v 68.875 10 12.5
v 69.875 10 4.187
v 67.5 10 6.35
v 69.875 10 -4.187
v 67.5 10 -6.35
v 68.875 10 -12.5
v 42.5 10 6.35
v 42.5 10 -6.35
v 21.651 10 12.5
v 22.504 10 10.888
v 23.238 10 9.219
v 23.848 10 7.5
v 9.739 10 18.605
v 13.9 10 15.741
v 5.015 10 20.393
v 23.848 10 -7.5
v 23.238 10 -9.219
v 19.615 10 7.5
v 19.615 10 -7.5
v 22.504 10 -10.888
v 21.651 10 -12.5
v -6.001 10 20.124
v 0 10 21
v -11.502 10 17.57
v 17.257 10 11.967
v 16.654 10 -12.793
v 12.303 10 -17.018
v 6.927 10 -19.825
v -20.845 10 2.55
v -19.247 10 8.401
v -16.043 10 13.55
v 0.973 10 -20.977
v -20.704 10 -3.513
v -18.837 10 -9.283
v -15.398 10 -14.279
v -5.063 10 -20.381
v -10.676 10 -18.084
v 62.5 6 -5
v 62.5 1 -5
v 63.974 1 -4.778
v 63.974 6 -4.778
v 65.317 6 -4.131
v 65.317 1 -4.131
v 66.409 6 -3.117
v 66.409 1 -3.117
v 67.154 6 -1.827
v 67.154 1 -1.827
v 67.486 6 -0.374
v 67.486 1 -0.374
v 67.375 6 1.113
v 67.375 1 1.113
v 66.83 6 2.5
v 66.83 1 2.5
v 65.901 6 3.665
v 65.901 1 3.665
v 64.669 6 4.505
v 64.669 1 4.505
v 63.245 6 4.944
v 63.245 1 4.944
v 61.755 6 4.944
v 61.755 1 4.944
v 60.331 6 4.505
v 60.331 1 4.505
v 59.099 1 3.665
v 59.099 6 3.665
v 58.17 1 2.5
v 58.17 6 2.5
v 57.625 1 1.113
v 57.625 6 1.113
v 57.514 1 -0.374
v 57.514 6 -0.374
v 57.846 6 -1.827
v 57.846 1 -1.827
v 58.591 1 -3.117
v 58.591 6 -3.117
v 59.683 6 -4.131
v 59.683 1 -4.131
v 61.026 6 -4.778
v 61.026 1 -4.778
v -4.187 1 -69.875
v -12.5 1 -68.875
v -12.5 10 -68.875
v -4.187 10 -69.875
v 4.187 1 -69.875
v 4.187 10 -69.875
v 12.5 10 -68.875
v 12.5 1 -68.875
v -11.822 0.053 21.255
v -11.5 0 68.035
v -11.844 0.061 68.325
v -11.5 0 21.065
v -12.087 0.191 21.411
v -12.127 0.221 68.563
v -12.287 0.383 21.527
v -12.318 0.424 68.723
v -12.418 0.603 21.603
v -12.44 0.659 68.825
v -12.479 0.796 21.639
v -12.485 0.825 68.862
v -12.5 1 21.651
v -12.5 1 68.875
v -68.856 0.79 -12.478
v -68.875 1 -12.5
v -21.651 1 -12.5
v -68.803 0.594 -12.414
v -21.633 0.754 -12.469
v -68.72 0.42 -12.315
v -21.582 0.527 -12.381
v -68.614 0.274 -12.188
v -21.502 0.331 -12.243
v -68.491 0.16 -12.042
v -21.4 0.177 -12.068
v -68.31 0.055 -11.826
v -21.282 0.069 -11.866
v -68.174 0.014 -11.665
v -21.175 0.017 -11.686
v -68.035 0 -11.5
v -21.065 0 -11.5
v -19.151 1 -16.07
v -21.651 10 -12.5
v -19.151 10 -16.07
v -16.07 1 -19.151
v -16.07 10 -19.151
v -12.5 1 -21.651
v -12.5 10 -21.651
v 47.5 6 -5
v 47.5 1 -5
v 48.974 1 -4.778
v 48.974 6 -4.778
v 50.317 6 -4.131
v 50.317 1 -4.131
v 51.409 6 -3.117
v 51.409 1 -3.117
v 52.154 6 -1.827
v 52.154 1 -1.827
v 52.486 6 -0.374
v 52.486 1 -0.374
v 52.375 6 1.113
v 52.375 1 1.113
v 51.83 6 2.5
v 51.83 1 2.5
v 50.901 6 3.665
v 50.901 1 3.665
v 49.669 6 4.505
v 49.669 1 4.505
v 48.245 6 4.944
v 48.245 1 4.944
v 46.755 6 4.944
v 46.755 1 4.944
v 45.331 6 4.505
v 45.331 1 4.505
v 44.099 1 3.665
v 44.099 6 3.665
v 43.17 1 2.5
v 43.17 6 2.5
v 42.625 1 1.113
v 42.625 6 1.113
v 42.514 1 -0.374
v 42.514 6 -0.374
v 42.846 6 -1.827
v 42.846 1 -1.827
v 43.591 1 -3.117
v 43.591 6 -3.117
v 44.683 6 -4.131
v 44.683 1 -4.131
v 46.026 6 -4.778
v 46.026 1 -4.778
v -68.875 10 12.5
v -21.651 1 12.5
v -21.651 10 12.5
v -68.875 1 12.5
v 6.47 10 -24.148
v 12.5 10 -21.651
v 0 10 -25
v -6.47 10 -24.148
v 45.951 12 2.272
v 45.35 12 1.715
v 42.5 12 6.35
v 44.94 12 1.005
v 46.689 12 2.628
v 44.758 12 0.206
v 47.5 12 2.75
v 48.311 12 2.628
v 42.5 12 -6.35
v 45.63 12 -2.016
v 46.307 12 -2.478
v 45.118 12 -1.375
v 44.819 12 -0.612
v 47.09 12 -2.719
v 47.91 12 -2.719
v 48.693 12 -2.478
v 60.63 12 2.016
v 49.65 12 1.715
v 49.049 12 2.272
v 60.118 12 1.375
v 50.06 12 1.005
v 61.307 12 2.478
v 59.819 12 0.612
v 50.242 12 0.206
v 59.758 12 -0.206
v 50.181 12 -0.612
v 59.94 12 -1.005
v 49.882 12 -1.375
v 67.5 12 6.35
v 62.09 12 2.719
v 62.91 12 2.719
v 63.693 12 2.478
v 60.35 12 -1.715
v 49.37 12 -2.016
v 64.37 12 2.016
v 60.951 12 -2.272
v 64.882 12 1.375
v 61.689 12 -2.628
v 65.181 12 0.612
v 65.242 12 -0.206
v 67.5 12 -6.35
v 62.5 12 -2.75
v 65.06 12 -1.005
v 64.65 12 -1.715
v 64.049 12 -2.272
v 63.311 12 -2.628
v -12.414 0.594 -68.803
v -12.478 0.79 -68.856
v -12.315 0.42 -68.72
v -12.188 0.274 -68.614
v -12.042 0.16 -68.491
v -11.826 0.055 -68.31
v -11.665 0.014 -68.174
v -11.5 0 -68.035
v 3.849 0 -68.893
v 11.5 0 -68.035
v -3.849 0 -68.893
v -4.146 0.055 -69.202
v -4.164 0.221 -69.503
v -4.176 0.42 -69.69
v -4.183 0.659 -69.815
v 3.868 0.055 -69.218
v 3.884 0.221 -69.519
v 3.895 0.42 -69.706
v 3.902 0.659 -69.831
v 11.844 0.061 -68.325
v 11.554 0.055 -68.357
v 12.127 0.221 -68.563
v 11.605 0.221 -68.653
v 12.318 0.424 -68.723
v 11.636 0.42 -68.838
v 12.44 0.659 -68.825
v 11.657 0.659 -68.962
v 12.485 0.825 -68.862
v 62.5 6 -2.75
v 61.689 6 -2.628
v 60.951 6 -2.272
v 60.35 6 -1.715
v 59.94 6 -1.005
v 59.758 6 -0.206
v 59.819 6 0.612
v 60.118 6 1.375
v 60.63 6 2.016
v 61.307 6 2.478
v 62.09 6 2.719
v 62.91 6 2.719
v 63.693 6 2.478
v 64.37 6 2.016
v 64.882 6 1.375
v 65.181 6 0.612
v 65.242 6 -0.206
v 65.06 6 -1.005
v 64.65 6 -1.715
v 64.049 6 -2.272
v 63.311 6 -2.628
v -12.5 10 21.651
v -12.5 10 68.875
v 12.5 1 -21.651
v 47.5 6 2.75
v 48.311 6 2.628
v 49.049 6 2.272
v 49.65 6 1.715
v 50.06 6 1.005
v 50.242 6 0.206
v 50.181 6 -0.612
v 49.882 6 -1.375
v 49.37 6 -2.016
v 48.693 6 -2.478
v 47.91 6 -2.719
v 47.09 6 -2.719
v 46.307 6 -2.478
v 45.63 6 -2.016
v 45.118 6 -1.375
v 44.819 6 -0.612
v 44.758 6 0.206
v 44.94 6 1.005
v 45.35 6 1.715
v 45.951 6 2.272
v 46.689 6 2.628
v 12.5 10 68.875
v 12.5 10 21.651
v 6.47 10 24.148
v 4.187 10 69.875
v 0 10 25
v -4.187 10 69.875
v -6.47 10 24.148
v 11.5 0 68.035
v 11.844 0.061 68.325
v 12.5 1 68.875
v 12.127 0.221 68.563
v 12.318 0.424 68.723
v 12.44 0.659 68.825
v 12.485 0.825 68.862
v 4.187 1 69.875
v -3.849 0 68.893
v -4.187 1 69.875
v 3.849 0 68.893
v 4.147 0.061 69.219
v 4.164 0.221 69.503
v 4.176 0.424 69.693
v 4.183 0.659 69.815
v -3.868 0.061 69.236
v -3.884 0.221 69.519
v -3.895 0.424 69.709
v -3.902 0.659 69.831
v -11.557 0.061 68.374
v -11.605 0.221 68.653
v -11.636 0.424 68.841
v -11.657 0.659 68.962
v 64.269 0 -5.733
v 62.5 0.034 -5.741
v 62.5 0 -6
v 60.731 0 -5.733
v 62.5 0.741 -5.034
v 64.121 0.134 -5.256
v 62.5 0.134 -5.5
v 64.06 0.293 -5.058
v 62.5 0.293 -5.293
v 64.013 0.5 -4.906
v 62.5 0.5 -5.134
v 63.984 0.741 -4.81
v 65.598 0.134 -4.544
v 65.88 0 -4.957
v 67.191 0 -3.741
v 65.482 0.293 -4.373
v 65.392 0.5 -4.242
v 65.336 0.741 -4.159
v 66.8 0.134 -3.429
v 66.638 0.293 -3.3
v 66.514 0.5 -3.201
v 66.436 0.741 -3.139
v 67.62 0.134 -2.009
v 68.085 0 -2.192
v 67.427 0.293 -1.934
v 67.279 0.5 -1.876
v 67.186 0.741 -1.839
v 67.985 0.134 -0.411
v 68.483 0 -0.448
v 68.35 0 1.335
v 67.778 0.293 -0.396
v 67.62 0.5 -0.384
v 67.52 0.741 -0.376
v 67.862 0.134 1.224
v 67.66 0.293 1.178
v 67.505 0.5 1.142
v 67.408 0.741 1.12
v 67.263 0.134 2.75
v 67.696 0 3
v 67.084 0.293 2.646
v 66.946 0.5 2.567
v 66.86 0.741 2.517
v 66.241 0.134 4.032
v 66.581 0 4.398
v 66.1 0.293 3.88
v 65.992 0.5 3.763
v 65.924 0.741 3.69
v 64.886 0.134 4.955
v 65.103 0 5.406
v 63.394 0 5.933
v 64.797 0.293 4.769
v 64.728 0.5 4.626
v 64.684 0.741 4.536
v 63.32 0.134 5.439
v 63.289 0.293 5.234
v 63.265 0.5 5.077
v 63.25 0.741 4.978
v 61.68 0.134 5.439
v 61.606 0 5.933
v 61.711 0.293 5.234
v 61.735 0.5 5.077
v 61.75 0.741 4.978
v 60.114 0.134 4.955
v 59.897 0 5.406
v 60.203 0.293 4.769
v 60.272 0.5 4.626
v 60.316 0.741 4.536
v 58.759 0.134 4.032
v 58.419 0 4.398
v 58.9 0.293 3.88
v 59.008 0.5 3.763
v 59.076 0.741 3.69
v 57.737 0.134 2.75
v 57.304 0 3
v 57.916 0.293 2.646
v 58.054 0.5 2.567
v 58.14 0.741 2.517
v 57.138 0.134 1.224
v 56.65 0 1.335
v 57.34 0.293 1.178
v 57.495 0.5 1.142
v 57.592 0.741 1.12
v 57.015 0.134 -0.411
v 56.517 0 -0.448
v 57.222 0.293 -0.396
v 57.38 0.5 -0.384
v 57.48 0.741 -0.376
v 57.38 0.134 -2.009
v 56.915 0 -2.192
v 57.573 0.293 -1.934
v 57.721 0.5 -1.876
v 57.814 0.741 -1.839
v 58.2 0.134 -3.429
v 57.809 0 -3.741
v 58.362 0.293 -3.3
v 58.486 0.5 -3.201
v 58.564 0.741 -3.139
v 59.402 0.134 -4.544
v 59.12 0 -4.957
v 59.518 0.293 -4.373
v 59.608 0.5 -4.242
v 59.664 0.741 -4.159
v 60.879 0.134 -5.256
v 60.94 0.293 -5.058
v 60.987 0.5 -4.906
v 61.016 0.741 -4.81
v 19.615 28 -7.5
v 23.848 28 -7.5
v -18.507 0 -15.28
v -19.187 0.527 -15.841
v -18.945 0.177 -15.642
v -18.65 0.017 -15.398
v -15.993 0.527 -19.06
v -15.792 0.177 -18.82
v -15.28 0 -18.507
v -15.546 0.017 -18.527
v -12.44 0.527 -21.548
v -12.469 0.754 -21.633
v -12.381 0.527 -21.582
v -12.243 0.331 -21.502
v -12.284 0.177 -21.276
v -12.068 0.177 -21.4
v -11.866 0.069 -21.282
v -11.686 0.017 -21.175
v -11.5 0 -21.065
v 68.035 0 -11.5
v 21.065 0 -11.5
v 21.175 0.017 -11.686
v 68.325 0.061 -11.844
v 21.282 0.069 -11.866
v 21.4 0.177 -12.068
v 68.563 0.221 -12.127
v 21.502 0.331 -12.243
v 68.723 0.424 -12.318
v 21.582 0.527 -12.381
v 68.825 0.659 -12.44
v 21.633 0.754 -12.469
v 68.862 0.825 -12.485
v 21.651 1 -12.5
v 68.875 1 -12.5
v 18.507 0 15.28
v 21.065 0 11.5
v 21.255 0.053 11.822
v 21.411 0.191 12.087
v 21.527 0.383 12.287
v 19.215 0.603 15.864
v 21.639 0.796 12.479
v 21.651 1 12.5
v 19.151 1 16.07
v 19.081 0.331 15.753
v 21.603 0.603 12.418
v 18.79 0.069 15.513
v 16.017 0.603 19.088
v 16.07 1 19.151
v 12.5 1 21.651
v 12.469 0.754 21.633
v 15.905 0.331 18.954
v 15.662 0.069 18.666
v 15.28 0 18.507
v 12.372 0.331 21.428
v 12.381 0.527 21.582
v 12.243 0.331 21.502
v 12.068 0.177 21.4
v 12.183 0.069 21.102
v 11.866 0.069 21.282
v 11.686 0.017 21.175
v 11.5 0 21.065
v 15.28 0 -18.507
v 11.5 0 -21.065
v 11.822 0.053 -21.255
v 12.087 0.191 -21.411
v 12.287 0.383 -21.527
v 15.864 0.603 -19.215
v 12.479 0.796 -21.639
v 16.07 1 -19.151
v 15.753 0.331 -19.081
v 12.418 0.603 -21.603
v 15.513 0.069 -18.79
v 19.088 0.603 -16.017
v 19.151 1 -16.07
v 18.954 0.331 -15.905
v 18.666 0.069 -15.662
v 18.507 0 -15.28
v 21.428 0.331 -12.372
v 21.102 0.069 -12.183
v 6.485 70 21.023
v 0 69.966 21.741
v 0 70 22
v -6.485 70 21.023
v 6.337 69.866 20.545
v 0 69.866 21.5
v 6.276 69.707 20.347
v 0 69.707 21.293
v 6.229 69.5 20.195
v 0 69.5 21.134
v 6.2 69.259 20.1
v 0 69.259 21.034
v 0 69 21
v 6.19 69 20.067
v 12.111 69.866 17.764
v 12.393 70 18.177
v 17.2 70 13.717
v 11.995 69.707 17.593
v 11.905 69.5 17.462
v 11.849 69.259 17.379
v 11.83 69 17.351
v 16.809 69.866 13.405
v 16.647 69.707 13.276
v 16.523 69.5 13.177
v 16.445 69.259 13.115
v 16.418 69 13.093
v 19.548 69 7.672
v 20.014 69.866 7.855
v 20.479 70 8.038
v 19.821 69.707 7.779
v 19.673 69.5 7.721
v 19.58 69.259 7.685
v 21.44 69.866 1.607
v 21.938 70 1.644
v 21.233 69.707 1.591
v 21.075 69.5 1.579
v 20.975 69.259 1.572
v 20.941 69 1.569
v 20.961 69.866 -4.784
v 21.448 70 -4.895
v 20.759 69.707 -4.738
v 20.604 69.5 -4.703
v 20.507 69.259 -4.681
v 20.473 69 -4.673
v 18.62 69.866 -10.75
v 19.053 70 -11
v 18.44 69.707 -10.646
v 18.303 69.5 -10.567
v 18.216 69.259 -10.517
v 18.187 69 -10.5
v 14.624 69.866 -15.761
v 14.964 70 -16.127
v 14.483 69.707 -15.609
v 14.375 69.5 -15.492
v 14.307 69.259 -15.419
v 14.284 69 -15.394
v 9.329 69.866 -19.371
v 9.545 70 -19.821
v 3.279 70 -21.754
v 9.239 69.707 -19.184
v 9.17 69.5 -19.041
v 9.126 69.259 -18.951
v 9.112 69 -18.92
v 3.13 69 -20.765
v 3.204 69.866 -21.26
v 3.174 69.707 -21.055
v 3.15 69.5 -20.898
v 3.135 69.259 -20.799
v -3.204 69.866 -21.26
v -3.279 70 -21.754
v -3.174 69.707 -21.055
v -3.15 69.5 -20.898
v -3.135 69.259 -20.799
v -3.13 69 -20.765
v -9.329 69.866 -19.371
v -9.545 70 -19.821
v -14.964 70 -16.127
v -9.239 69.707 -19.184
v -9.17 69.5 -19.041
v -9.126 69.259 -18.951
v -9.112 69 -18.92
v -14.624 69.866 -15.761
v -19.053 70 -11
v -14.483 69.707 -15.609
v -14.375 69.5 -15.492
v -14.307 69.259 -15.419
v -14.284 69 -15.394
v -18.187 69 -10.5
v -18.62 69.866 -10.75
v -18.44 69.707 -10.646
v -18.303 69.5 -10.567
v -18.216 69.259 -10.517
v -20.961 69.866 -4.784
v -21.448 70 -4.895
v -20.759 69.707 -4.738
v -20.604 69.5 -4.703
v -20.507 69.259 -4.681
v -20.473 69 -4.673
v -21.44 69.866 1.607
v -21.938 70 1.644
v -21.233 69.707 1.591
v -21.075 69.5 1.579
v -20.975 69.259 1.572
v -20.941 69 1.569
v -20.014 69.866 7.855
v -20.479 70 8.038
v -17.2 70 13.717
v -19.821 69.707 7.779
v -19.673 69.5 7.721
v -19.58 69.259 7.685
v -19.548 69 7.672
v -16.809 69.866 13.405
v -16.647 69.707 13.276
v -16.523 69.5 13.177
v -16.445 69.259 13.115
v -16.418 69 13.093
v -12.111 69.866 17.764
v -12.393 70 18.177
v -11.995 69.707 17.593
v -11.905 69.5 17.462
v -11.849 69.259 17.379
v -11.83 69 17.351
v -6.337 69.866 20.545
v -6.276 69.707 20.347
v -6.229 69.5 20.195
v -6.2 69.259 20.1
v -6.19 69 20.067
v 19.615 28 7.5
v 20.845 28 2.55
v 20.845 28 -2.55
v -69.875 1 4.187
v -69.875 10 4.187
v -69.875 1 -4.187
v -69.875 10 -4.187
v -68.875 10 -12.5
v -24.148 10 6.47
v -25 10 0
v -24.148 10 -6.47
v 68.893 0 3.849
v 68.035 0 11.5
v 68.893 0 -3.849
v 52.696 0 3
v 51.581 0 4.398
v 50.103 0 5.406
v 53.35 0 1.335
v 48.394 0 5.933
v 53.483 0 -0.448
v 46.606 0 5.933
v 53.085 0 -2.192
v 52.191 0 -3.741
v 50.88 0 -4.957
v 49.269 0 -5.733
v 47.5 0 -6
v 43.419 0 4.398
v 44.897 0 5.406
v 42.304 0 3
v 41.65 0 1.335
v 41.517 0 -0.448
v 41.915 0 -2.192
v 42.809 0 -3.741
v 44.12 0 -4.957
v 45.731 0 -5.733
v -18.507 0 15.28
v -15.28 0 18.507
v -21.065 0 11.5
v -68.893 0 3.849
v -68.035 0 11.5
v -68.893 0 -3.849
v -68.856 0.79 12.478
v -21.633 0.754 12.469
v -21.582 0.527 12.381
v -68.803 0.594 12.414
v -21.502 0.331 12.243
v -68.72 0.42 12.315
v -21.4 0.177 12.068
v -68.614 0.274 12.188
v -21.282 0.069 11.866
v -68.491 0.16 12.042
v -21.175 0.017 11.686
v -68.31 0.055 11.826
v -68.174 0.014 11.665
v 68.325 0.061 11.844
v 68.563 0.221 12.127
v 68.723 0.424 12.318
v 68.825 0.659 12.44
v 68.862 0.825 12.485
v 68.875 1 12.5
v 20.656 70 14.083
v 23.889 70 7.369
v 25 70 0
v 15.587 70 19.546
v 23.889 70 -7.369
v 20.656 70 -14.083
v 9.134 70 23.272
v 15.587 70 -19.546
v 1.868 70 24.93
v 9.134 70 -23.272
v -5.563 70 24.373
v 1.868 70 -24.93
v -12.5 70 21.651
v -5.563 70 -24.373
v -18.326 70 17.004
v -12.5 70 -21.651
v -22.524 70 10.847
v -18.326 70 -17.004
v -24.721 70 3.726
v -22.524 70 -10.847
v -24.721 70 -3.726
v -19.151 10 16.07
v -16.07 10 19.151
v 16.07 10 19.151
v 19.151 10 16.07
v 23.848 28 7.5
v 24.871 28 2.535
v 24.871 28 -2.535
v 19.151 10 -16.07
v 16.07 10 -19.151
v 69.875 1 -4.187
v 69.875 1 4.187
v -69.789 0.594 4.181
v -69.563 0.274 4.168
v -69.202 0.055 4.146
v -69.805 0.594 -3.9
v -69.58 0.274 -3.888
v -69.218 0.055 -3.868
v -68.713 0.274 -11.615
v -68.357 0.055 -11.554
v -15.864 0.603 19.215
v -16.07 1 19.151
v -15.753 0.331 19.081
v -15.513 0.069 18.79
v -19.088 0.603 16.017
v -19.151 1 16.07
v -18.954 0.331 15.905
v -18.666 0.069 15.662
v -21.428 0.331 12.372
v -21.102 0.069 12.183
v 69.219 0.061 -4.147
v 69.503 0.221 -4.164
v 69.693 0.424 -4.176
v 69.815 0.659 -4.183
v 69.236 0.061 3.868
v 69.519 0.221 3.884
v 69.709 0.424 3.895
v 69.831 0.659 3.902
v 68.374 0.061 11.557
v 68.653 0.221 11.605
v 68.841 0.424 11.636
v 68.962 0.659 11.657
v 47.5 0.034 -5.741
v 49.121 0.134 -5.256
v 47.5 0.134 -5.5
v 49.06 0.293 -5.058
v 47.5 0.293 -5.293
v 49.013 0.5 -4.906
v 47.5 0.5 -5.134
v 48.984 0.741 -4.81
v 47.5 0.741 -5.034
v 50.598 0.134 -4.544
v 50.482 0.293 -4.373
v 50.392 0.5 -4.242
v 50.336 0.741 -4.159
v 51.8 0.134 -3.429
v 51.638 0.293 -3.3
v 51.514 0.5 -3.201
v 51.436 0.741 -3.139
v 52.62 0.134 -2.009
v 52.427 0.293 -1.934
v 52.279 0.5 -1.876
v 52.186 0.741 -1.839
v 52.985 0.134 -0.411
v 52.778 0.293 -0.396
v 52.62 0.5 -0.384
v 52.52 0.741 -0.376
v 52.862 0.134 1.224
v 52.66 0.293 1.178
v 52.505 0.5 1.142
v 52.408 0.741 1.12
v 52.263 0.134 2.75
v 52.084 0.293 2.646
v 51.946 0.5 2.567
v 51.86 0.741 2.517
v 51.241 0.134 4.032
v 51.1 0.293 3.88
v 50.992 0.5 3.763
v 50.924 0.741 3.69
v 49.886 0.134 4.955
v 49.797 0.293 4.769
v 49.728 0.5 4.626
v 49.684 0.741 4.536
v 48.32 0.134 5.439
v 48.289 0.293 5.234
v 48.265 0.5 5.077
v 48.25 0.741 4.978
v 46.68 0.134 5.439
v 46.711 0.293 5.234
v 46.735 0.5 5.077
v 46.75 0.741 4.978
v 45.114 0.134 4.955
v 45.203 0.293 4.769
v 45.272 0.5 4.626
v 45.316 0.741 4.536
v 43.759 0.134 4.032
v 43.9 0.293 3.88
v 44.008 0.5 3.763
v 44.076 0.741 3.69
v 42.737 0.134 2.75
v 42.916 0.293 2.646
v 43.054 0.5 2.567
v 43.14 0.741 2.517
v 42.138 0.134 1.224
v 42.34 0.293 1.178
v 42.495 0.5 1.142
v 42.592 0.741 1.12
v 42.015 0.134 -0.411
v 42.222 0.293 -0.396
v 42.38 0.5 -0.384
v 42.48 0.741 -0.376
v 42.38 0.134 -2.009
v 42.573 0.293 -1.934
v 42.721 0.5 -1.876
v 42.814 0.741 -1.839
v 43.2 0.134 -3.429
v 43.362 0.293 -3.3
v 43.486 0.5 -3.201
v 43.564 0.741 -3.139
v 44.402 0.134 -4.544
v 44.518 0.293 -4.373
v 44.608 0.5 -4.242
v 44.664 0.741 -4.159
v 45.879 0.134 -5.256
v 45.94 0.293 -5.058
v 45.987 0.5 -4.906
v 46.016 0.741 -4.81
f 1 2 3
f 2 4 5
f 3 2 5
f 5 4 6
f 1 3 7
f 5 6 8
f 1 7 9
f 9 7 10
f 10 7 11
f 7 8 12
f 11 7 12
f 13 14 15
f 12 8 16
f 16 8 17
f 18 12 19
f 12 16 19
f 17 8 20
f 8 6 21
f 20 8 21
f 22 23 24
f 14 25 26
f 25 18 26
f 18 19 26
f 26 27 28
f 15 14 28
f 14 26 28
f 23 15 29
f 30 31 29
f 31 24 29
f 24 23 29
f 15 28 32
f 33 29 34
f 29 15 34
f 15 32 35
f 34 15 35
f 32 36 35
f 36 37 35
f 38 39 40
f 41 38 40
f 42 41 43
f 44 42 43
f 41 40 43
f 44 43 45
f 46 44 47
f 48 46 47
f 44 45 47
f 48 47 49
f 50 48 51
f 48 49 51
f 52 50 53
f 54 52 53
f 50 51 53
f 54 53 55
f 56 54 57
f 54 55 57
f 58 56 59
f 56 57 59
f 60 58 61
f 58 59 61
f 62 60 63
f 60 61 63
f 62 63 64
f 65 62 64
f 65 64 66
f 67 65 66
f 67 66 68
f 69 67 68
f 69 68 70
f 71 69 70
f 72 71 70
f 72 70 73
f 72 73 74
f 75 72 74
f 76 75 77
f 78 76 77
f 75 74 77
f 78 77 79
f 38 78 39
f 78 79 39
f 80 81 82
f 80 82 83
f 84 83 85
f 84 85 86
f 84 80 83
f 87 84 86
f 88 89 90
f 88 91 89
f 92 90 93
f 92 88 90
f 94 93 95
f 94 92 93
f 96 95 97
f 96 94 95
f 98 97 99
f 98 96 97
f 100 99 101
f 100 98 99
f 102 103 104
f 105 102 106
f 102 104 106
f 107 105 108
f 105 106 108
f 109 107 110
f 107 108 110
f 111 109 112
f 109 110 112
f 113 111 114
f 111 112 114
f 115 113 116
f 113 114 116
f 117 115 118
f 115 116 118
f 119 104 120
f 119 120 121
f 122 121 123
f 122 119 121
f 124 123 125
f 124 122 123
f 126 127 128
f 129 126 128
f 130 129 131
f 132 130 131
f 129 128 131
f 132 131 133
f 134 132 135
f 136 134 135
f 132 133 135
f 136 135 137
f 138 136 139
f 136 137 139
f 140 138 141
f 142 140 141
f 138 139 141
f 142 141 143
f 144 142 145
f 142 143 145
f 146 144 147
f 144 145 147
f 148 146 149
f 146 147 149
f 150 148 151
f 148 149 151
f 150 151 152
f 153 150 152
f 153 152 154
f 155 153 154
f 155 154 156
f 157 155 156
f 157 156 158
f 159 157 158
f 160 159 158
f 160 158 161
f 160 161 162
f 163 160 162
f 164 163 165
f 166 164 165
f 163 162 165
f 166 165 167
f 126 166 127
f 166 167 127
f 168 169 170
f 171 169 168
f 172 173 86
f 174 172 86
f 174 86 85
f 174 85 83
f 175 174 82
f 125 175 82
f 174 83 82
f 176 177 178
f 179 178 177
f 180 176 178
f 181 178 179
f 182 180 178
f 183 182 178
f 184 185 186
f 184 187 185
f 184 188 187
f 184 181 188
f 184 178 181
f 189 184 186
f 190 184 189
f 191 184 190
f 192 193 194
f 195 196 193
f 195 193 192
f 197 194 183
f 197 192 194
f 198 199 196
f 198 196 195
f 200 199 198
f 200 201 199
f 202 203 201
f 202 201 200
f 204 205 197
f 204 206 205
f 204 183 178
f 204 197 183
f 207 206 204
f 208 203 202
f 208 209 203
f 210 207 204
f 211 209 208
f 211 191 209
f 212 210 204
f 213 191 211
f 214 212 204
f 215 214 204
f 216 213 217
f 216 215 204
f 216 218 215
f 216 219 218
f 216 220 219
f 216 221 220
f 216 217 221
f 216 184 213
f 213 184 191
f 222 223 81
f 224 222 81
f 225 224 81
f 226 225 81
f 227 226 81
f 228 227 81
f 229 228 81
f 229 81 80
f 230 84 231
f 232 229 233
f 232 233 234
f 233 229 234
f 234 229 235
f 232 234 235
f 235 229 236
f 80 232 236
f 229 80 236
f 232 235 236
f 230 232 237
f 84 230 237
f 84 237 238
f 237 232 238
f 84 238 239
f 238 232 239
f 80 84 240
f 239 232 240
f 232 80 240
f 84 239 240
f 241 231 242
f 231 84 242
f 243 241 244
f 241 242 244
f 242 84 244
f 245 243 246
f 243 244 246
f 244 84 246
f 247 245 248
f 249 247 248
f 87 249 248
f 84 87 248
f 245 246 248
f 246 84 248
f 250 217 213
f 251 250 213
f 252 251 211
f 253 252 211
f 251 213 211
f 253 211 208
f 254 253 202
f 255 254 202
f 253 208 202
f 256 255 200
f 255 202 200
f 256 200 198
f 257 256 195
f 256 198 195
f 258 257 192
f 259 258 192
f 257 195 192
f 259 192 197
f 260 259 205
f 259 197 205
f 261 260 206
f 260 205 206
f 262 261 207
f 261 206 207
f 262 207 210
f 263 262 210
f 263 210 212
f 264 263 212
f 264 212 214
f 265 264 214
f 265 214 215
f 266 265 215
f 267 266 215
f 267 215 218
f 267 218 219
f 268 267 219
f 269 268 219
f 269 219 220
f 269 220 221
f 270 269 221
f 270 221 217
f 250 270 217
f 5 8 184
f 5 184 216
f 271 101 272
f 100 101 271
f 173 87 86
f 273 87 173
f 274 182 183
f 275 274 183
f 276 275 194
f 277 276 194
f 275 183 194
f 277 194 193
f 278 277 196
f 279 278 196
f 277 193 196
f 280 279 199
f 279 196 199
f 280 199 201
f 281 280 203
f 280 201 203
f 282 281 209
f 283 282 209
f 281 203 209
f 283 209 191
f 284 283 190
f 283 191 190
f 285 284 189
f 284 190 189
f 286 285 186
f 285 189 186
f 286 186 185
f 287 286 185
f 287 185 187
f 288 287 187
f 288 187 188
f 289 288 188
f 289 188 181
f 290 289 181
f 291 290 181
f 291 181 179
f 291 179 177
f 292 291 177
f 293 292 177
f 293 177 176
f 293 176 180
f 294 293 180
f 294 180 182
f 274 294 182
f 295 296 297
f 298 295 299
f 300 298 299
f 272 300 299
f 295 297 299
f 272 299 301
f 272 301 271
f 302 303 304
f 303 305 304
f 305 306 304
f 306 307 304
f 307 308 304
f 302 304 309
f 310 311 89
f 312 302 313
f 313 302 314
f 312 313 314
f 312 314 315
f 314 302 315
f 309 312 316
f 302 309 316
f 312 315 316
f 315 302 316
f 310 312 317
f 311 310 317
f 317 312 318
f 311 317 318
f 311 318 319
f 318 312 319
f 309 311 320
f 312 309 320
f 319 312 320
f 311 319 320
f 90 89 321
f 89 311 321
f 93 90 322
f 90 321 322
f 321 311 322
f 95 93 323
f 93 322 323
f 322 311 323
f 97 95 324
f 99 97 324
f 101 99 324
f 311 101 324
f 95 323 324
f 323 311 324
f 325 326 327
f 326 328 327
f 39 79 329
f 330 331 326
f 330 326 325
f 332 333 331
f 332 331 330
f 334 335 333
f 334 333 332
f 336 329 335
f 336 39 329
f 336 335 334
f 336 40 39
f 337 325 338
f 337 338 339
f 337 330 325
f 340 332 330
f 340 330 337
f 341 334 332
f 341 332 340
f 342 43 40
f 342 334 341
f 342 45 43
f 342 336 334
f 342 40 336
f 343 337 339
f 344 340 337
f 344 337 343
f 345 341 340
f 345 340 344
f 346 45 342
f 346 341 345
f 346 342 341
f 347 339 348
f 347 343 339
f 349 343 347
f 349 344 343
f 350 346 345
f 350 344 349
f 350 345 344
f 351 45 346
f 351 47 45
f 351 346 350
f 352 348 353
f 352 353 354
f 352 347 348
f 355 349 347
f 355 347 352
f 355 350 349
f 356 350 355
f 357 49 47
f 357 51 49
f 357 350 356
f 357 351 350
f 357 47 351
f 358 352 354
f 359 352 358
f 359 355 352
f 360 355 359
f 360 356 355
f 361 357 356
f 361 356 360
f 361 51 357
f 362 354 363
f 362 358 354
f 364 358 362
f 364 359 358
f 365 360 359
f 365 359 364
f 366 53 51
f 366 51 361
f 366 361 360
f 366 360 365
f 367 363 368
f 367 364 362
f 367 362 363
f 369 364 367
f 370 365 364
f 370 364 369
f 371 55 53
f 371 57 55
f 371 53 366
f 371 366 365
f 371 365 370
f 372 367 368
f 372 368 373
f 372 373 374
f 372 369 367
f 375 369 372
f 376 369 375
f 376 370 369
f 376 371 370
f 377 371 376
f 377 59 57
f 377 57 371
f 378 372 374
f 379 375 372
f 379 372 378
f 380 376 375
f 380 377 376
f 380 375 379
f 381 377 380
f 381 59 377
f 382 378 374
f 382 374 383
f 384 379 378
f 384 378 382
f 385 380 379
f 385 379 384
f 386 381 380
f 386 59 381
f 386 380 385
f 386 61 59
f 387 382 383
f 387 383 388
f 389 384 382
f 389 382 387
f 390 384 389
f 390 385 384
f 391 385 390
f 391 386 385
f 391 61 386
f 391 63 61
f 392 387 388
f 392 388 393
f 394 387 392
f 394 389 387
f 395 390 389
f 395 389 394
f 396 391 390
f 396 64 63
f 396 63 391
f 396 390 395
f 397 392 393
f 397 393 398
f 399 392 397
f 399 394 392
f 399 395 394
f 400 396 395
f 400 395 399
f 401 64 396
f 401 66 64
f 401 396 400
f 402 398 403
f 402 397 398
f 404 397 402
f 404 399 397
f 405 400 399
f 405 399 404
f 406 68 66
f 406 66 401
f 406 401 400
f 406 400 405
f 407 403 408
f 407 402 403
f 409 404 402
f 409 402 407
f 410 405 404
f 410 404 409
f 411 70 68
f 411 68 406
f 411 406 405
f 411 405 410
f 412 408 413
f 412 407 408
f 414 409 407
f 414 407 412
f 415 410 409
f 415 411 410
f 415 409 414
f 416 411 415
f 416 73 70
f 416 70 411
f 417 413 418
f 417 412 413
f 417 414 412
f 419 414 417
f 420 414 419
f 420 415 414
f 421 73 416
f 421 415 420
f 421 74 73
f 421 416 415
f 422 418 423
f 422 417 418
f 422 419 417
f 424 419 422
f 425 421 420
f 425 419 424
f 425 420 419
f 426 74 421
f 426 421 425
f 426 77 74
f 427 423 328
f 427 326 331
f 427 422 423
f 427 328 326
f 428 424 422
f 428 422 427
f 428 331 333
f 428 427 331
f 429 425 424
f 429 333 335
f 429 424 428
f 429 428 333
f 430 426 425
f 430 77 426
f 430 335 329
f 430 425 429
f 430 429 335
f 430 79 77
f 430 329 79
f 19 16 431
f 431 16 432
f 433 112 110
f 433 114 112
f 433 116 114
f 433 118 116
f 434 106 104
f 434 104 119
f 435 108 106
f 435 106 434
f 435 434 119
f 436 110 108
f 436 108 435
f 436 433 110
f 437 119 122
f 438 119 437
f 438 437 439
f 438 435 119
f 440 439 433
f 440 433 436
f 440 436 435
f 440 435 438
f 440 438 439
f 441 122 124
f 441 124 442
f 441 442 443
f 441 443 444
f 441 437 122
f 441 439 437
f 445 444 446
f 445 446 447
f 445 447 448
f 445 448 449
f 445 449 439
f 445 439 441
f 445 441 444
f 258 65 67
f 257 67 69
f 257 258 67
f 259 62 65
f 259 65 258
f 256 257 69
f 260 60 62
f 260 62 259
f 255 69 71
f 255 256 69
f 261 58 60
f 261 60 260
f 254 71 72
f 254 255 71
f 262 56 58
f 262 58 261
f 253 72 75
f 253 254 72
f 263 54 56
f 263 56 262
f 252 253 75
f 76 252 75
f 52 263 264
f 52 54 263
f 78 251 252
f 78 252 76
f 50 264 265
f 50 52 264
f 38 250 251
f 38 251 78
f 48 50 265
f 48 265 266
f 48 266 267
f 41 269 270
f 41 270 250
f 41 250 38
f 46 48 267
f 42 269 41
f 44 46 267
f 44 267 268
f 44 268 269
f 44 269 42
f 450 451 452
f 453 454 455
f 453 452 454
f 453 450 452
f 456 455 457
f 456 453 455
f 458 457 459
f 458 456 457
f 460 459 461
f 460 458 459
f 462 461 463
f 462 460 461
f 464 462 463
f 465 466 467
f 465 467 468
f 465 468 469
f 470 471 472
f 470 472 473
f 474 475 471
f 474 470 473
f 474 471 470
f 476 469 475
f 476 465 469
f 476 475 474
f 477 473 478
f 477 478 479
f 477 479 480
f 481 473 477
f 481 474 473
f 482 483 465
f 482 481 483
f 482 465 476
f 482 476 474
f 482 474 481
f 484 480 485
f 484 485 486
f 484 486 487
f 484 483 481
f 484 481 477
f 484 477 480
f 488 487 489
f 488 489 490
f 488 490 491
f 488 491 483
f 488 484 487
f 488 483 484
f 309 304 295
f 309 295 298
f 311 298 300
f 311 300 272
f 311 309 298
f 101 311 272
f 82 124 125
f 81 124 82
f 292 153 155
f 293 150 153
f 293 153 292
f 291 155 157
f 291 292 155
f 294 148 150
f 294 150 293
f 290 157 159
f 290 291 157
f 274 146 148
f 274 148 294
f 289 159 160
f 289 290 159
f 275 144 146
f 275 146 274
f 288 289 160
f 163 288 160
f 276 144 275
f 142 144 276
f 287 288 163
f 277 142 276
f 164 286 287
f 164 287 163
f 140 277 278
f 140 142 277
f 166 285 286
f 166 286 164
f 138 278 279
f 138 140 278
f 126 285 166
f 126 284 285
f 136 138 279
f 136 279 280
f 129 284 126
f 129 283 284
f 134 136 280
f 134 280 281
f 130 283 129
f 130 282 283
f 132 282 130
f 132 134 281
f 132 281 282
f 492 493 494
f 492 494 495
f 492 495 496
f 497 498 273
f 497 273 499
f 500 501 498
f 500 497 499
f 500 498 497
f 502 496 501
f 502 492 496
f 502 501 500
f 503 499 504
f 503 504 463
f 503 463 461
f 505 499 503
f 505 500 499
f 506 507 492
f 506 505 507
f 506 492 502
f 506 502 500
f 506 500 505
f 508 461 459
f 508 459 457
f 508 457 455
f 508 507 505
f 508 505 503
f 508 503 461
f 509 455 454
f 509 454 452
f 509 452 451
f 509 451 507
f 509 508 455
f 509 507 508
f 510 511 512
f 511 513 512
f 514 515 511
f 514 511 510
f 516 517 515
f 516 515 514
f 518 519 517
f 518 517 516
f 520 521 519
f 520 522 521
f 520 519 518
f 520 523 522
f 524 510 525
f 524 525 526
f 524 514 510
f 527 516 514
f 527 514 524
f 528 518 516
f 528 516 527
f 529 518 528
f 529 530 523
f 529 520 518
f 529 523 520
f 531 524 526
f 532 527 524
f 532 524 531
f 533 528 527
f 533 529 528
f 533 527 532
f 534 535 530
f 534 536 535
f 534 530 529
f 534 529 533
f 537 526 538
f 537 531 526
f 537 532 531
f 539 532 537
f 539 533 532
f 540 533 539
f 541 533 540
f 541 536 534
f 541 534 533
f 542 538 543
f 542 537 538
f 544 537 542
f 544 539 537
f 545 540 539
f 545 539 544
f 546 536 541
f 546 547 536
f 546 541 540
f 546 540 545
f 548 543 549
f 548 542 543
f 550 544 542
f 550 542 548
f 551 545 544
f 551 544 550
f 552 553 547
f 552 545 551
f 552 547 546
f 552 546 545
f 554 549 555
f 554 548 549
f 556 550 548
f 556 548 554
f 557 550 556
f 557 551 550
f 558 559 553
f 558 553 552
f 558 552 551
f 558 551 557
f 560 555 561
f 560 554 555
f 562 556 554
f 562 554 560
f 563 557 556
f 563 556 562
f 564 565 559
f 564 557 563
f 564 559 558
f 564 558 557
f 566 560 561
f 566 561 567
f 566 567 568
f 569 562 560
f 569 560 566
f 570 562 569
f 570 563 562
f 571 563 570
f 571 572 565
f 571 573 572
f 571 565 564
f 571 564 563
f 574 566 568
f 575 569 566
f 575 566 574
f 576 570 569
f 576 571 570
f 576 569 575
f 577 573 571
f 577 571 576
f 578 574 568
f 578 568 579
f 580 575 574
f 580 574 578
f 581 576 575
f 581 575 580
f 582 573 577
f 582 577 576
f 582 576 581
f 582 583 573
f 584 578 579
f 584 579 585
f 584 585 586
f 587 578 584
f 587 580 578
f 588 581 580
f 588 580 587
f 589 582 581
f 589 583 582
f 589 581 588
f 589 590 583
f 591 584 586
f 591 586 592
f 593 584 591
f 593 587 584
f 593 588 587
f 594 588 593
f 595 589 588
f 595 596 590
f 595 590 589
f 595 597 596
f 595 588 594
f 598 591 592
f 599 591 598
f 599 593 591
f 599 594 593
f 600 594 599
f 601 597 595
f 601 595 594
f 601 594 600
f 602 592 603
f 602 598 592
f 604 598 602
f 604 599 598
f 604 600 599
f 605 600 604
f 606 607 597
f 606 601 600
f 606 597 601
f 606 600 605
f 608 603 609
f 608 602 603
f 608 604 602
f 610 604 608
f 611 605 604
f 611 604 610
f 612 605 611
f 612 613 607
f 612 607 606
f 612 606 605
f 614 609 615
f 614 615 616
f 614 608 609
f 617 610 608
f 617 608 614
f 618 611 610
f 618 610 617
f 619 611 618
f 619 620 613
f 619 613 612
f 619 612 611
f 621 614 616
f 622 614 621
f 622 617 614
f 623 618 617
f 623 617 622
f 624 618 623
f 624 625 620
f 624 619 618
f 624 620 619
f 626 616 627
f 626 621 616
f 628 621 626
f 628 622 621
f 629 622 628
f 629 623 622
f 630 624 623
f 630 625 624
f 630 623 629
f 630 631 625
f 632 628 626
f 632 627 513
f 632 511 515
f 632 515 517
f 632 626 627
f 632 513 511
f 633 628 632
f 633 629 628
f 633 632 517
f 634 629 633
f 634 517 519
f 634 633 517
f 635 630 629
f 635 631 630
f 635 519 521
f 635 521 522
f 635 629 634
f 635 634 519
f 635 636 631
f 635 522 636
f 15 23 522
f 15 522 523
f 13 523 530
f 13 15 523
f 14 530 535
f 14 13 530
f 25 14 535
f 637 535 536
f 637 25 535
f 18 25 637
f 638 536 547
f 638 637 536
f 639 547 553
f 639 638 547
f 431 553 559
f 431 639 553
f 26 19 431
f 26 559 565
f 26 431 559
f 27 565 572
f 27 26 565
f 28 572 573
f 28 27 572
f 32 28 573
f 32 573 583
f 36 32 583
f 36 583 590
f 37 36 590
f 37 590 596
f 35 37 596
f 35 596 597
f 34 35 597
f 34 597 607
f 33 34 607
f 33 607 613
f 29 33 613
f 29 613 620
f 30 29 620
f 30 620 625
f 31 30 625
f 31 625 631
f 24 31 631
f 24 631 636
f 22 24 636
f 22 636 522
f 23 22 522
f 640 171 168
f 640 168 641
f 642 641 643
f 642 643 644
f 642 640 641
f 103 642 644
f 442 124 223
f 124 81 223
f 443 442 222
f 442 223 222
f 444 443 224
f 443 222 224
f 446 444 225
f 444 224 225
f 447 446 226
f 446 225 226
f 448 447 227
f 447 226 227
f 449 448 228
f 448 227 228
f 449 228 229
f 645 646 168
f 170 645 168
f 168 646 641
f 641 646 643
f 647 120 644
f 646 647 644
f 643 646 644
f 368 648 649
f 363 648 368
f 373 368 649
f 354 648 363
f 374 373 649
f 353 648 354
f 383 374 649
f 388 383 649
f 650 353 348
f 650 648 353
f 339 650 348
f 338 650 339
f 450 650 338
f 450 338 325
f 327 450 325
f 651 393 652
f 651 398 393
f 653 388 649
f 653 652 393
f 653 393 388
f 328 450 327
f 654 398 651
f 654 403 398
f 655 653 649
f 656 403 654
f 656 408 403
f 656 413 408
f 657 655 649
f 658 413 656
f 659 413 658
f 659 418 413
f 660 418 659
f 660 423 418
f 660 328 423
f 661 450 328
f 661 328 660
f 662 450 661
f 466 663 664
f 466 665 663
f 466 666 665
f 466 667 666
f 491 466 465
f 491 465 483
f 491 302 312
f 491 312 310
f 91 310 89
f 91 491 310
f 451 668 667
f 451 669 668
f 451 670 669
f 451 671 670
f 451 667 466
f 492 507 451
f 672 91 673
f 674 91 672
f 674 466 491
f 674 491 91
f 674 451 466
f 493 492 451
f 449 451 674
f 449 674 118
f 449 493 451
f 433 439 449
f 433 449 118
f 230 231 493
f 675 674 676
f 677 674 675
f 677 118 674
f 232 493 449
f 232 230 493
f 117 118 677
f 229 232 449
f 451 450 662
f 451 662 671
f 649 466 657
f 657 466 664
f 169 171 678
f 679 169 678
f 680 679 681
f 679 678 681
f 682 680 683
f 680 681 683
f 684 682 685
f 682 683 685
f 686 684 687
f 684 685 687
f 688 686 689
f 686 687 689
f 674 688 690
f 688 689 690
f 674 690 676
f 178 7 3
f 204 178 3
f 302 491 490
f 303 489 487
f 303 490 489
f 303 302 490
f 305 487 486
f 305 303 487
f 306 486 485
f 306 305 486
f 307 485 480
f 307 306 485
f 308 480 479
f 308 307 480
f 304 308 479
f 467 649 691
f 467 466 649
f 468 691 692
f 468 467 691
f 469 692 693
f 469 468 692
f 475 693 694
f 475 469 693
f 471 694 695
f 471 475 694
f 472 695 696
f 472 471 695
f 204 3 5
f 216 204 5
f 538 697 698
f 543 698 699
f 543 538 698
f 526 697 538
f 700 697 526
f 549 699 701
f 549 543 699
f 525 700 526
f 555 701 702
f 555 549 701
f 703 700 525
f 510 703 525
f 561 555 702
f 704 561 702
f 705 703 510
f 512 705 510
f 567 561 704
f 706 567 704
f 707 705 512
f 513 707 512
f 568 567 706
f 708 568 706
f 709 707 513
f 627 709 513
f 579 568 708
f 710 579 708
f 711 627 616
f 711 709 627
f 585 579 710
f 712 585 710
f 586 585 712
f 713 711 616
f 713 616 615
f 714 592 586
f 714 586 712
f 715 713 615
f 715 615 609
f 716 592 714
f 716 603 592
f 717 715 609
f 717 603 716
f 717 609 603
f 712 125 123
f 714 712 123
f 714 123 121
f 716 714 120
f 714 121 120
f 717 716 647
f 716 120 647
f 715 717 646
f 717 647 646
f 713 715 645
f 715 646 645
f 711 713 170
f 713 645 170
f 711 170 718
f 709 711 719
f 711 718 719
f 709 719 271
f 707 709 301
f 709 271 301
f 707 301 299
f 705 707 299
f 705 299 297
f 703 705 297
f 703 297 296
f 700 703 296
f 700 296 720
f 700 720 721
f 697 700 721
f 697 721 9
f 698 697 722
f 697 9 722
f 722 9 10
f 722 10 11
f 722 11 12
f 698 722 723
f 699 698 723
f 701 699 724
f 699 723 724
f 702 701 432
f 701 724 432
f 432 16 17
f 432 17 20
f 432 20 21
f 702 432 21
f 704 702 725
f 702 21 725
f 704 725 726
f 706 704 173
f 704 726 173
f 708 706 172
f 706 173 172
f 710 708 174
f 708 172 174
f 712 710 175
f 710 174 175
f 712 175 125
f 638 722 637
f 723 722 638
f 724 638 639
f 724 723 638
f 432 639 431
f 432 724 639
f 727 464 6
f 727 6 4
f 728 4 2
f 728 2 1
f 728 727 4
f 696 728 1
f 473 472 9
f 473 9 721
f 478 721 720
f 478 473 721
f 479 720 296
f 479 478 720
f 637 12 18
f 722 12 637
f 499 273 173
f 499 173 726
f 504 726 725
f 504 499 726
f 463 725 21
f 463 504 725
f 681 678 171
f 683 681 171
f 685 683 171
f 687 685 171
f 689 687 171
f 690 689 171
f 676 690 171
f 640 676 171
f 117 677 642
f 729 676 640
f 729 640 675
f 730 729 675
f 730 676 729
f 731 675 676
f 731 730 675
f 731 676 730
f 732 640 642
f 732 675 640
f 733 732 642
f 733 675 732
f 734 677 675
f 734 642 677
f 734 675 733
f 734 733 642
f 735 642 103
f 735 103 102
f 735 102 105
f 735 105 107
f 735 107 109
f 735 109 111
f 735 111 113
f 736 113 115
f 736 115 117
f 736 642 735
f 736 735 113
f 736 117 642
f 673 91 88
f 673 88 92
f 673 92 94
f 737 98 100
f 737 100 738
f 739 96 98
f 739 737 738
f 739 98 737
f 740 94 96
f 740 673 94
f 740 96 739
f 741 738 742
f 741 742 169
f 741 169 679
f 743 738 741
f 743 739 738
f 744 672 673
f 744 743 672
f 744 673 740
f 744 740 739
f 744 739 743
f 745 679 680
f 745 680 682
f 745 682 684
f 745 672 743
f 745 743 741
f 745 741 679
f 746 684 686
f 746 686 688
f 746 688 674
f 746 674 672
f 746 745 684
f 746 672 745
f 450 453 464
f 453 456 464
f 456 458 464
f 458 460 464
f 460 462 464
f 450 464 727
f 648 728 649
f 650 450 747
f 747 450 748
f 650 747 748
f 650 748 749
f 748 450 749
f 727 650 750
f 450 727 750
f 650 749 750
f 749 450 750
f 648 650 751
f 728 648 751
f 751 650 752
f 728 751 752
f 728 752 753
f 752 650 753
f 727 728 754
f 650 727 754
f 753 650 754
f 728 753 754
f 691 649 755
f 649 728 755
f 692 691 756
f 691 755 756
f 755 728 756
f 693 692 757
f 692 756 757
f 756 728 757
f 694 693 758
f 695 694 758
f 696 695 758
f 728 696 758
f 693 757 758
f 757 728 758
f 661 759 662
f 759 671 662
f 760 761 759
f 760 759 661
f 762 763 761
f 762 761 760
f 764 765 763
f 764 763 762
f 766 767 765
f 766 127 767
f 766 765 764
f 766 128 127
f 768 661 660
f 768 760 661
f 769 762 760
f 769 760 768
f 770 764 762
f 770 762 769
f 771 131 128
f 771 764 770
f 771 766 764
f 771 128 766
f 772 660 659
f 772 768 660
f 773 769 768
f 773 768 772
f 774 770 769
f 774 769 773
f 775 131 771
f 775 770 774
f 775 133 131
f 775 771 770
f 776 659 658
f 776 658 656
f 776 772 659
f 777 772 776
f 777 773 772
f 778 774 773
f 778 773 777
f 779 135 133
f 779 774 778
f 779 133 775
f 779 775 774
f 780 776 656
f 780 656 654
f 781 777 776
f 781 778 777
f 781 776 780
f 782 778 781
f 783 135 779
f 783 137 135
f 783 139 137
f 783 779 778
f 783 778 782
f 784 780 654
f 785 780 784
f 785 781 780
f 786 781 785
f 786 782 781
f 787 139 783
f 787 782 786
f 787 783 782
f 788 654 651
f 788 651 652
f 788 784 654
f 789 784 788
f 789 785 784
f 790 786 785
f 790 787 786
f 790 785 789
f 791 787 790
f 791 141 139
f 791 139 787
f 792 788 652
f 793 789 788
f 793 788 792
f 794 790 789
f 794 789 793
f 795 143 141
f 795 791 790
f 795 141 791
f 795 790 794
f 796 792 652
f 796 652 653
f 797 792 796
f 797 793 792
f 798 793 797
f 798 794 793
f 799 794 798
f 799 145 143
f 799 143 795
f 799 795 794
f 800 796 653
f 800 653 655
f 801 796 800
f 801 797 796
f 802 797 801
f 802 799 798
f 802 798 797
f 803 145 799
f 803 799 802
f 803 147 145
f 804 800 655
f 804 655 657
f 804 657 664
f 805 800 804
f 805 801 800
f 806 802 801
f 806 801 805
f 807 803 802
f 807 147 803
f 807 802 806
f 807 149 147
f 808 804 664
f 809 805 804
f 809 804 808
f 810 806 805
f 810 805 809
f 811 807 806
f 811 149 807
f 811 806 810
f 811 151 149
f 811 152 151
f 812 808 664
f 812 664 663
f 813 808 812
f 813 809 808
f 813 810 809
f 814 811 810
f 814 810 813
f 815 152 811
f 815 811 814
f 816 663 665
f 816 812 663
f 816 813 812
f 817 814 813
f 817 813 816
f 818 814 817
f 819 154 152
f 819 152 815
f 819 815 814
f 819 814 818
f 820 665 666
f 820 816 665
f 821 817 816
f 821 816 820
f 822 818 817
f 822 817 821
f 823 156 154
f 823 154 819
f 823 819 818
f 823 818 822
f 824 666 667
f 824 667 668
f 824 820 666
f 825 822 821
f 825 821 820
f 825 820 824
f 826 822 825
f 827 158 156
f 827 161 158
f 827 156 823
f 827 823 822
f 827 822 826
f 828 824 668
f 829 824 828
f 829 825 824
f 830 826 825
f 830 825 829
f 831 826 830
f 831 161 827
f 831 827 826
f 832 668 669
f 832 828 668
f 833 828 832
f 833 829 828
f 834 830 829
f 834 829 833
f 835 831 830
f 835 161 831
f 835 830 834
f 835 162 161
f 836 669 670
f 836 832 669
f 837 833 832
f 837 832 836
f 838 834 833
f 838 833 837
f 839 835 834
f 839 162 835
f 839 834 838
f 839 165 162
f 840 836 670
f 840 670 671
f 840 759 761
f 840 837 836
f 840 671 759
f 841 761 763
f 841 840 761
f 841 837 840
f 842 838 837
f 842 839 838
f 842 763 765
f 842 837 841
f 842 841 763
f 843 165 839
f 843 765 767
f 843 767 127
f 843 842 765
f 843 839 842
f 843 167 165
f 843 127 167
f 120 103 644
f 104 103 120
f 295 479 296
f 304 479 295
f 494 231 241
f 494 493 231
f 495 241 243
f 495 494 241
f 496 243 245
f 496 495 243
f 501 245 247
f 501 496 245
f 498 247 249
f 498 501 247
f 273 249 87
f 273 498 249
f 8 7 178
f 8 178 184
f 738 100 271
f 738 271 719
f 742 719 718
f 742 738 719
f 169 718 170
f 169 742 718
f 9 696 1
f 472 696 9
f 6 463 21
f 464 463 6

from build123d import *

# Parameters (mm, degrees)
BOSS_EXTRUDE1_DEPTH = 10
SKETCH2_R           = 25
SKETCH2_R_2         = 21
BOSS_EXTRUDE2_DEPTH = 60
SKETCH3_W           = 15
SKETCH3_H           = 18
CUT_EXTRUDE1_DEPTH  = 10
SKETCH4_W           = 25
SKETCH4_H           = 12.7
BOSS_EXTRUDE3_DEPTH = 2
SKETCH5_R           = 2.75
CUT_EXTRUDE2_DEPTH  = 115.734476074
SKETCH6_R           = 5
CUT_EXTRUDE3_DEPTH  = 6
FILLET1_R           = 1


with BuildPart() as part:
    # Sketch1 → Boss-Extrude1 (new body)
    with BuildSketch(Plane(origin=(0, 0, 0), x_dir=(1, 0, 0), z_dir=(0, 1, 0))):
        with BuildLine():
            Line((-68.87488657, 12.5), (-21.650635095, 12.5))
            ThreePointArc((-21.650635095, 12.5), (-17.67766953, 17.67766953), (-12.5, 21.650635095))
            Line((-12.5, 21.650635095), (-12.5, 68.87488657))
            ThreePointArc((-12.5, 68.87488657), (0, 70), (12.5, 68.87488657))
            Line((12.5, 68.87488657), (12.5, 21.650635095))
            ThreePointArc((12.5, 21.650635095), (17.67766953, 17.67766953), (21.650635095, 12.5))
            Line((21.650635095, 12.5), (68.87488657, 12.5))
            ThreePointArc((68.87488657, 12.5), (70, 0), (68.87488657, -12.5))
            Line((68.87488657, -12.5), (21.650635095, -12.5))
            ThreePointArc((21.650635095, -12.5), (17.67766953, -17.67766953), (12.5, -21.650635095))
            Line((12.5, -21.650635095), (12.5, -68.87488657))
            ThreePointArc((12.5, -68.87488657), (0, -70), (-12.5, -68.87488657))
            Line((-12.5, -68.87488657), (-12.5, -21.650635095))
            ThreePointArc((-12.5, -21.650635095), (-17.67766953, -17.67766953), (-21.650635095, -12.5))
            Line((-21.650635095, -12.5), (-68.87488657, -12.5))
            ThreePointArc((-68.87488657, -12.5), (-70, 0), (-68.87488657, 12.5))
        make_face()
    extrude(amount=BOSS_EXTRUDE1_DEPTH)

    # Sketch2 → Boss-Extrude2 (add)
    with BuildSketch(Plane(origin=(0, 10, 0), x_dir=(1, 0, 0), z_dir=(0, 1, 0))):
        with Locations(Location((0, 0, 0), (0, 0, 120))):
            Circle(SKETCH2_R)
        with Locations(Location((0, 0, 0), (0, 0, 270))):
            Circle(SKETCH2_R_2, mode=Mode.SUBTRACT)
    extrude(amount=BOSS_EXTRUDE2_DEPTH)

    # Sketch3 → Cut-Extrude1 (cut)
    with BuildSketch(Plane(origin=(25, 0, 0), x_dir=(0, 0, -1), z_dir=(1, 0, 0))):
        with Locations((0, 19)):
            Rectangle(SKETCH3_W, SKETCH3_H)
    extrude(amount=-CUT_EXTRUDE1_DEPTH, mode=Mode.SUBTRACT)

    # Sketch4 → Boss-Extrude3 (add)
    with BuildSketch(Plane(origin=(0, 10, 0), x_dir=(1, 0, 0), z_dir=(0, 1, 0))):
        with Locations((55, 0)):
            Rectangle(SKETCH4_W, SKETCH4_H)
    extrude(amount=BOSS_EXTRUDE3_DEPTH)

    # Sketch5 → Cut-Extrude2 (cut, through all)
    with BuildSketch(Plane(origin=(0, 12, 0), x_dir=(1, 0, 0), z_dir=(0, 1, 0))):
        with Locations(Location((47.5, 0, 0), (0, 0, 270))):
            Circle(SKETCH5_R)
        with Locations(Location((62.5, 0, 0), (0, 0, 90))):
            Circle(SKETCH5_R)
    extrude(amount=-CUT_EXTRUDE2_DEPTH, mode=Mode.SUBTRACT)

    # Sketch6 → Cut-Extrude3 (cut)
    with BuildSketch(Plane.XZ):
        with Locations(Location((47.5, 0, 0), (0, 0, 270))):
            Circle(SKETCH6_R)
        with Locations(Location((62.5, 0, 0), (0, 0, 270))):
            Circle(SKETCH6_R)
    extrude(amount=-CUT_EXTRUDE3_DEPTH, mode=Mode.SUBTRACT)

    # Fillet1
    fillet1_edges = [part.edges().sort_by_distance(p)[0] for p in [
        (47.5, 0, 5),
        (62.5, 0, 5),
        (-45.262760832, 0, -12.5),
        (-17.67766953, 0, -17.67766953),
        (-12.5, 0, -45.262760832),
        (0, 0, -70),
        (12.5, 0, -45.262760832),
        (17.67766953, 0, -17.67766953),
        (45.262760832, 0, -12.5),
        (70, 0, 0),
        (45.262760832, 0, 12.5),
        (17.67766953, 0, 17.67766953),
        (12.5, 0, 45.262760832),
        (0, 0, 70),
        (-12.5, 0, 45.262760832),
        (-17.67766953, 0, 17.67766953),
        (-45.262760832, 0, 12.5),
        (-70, 0, 0),
        (0, 70, -21),
    ]]
    fillet(fillet1_edges, radius=FILLET1_R)


solid = part.part
